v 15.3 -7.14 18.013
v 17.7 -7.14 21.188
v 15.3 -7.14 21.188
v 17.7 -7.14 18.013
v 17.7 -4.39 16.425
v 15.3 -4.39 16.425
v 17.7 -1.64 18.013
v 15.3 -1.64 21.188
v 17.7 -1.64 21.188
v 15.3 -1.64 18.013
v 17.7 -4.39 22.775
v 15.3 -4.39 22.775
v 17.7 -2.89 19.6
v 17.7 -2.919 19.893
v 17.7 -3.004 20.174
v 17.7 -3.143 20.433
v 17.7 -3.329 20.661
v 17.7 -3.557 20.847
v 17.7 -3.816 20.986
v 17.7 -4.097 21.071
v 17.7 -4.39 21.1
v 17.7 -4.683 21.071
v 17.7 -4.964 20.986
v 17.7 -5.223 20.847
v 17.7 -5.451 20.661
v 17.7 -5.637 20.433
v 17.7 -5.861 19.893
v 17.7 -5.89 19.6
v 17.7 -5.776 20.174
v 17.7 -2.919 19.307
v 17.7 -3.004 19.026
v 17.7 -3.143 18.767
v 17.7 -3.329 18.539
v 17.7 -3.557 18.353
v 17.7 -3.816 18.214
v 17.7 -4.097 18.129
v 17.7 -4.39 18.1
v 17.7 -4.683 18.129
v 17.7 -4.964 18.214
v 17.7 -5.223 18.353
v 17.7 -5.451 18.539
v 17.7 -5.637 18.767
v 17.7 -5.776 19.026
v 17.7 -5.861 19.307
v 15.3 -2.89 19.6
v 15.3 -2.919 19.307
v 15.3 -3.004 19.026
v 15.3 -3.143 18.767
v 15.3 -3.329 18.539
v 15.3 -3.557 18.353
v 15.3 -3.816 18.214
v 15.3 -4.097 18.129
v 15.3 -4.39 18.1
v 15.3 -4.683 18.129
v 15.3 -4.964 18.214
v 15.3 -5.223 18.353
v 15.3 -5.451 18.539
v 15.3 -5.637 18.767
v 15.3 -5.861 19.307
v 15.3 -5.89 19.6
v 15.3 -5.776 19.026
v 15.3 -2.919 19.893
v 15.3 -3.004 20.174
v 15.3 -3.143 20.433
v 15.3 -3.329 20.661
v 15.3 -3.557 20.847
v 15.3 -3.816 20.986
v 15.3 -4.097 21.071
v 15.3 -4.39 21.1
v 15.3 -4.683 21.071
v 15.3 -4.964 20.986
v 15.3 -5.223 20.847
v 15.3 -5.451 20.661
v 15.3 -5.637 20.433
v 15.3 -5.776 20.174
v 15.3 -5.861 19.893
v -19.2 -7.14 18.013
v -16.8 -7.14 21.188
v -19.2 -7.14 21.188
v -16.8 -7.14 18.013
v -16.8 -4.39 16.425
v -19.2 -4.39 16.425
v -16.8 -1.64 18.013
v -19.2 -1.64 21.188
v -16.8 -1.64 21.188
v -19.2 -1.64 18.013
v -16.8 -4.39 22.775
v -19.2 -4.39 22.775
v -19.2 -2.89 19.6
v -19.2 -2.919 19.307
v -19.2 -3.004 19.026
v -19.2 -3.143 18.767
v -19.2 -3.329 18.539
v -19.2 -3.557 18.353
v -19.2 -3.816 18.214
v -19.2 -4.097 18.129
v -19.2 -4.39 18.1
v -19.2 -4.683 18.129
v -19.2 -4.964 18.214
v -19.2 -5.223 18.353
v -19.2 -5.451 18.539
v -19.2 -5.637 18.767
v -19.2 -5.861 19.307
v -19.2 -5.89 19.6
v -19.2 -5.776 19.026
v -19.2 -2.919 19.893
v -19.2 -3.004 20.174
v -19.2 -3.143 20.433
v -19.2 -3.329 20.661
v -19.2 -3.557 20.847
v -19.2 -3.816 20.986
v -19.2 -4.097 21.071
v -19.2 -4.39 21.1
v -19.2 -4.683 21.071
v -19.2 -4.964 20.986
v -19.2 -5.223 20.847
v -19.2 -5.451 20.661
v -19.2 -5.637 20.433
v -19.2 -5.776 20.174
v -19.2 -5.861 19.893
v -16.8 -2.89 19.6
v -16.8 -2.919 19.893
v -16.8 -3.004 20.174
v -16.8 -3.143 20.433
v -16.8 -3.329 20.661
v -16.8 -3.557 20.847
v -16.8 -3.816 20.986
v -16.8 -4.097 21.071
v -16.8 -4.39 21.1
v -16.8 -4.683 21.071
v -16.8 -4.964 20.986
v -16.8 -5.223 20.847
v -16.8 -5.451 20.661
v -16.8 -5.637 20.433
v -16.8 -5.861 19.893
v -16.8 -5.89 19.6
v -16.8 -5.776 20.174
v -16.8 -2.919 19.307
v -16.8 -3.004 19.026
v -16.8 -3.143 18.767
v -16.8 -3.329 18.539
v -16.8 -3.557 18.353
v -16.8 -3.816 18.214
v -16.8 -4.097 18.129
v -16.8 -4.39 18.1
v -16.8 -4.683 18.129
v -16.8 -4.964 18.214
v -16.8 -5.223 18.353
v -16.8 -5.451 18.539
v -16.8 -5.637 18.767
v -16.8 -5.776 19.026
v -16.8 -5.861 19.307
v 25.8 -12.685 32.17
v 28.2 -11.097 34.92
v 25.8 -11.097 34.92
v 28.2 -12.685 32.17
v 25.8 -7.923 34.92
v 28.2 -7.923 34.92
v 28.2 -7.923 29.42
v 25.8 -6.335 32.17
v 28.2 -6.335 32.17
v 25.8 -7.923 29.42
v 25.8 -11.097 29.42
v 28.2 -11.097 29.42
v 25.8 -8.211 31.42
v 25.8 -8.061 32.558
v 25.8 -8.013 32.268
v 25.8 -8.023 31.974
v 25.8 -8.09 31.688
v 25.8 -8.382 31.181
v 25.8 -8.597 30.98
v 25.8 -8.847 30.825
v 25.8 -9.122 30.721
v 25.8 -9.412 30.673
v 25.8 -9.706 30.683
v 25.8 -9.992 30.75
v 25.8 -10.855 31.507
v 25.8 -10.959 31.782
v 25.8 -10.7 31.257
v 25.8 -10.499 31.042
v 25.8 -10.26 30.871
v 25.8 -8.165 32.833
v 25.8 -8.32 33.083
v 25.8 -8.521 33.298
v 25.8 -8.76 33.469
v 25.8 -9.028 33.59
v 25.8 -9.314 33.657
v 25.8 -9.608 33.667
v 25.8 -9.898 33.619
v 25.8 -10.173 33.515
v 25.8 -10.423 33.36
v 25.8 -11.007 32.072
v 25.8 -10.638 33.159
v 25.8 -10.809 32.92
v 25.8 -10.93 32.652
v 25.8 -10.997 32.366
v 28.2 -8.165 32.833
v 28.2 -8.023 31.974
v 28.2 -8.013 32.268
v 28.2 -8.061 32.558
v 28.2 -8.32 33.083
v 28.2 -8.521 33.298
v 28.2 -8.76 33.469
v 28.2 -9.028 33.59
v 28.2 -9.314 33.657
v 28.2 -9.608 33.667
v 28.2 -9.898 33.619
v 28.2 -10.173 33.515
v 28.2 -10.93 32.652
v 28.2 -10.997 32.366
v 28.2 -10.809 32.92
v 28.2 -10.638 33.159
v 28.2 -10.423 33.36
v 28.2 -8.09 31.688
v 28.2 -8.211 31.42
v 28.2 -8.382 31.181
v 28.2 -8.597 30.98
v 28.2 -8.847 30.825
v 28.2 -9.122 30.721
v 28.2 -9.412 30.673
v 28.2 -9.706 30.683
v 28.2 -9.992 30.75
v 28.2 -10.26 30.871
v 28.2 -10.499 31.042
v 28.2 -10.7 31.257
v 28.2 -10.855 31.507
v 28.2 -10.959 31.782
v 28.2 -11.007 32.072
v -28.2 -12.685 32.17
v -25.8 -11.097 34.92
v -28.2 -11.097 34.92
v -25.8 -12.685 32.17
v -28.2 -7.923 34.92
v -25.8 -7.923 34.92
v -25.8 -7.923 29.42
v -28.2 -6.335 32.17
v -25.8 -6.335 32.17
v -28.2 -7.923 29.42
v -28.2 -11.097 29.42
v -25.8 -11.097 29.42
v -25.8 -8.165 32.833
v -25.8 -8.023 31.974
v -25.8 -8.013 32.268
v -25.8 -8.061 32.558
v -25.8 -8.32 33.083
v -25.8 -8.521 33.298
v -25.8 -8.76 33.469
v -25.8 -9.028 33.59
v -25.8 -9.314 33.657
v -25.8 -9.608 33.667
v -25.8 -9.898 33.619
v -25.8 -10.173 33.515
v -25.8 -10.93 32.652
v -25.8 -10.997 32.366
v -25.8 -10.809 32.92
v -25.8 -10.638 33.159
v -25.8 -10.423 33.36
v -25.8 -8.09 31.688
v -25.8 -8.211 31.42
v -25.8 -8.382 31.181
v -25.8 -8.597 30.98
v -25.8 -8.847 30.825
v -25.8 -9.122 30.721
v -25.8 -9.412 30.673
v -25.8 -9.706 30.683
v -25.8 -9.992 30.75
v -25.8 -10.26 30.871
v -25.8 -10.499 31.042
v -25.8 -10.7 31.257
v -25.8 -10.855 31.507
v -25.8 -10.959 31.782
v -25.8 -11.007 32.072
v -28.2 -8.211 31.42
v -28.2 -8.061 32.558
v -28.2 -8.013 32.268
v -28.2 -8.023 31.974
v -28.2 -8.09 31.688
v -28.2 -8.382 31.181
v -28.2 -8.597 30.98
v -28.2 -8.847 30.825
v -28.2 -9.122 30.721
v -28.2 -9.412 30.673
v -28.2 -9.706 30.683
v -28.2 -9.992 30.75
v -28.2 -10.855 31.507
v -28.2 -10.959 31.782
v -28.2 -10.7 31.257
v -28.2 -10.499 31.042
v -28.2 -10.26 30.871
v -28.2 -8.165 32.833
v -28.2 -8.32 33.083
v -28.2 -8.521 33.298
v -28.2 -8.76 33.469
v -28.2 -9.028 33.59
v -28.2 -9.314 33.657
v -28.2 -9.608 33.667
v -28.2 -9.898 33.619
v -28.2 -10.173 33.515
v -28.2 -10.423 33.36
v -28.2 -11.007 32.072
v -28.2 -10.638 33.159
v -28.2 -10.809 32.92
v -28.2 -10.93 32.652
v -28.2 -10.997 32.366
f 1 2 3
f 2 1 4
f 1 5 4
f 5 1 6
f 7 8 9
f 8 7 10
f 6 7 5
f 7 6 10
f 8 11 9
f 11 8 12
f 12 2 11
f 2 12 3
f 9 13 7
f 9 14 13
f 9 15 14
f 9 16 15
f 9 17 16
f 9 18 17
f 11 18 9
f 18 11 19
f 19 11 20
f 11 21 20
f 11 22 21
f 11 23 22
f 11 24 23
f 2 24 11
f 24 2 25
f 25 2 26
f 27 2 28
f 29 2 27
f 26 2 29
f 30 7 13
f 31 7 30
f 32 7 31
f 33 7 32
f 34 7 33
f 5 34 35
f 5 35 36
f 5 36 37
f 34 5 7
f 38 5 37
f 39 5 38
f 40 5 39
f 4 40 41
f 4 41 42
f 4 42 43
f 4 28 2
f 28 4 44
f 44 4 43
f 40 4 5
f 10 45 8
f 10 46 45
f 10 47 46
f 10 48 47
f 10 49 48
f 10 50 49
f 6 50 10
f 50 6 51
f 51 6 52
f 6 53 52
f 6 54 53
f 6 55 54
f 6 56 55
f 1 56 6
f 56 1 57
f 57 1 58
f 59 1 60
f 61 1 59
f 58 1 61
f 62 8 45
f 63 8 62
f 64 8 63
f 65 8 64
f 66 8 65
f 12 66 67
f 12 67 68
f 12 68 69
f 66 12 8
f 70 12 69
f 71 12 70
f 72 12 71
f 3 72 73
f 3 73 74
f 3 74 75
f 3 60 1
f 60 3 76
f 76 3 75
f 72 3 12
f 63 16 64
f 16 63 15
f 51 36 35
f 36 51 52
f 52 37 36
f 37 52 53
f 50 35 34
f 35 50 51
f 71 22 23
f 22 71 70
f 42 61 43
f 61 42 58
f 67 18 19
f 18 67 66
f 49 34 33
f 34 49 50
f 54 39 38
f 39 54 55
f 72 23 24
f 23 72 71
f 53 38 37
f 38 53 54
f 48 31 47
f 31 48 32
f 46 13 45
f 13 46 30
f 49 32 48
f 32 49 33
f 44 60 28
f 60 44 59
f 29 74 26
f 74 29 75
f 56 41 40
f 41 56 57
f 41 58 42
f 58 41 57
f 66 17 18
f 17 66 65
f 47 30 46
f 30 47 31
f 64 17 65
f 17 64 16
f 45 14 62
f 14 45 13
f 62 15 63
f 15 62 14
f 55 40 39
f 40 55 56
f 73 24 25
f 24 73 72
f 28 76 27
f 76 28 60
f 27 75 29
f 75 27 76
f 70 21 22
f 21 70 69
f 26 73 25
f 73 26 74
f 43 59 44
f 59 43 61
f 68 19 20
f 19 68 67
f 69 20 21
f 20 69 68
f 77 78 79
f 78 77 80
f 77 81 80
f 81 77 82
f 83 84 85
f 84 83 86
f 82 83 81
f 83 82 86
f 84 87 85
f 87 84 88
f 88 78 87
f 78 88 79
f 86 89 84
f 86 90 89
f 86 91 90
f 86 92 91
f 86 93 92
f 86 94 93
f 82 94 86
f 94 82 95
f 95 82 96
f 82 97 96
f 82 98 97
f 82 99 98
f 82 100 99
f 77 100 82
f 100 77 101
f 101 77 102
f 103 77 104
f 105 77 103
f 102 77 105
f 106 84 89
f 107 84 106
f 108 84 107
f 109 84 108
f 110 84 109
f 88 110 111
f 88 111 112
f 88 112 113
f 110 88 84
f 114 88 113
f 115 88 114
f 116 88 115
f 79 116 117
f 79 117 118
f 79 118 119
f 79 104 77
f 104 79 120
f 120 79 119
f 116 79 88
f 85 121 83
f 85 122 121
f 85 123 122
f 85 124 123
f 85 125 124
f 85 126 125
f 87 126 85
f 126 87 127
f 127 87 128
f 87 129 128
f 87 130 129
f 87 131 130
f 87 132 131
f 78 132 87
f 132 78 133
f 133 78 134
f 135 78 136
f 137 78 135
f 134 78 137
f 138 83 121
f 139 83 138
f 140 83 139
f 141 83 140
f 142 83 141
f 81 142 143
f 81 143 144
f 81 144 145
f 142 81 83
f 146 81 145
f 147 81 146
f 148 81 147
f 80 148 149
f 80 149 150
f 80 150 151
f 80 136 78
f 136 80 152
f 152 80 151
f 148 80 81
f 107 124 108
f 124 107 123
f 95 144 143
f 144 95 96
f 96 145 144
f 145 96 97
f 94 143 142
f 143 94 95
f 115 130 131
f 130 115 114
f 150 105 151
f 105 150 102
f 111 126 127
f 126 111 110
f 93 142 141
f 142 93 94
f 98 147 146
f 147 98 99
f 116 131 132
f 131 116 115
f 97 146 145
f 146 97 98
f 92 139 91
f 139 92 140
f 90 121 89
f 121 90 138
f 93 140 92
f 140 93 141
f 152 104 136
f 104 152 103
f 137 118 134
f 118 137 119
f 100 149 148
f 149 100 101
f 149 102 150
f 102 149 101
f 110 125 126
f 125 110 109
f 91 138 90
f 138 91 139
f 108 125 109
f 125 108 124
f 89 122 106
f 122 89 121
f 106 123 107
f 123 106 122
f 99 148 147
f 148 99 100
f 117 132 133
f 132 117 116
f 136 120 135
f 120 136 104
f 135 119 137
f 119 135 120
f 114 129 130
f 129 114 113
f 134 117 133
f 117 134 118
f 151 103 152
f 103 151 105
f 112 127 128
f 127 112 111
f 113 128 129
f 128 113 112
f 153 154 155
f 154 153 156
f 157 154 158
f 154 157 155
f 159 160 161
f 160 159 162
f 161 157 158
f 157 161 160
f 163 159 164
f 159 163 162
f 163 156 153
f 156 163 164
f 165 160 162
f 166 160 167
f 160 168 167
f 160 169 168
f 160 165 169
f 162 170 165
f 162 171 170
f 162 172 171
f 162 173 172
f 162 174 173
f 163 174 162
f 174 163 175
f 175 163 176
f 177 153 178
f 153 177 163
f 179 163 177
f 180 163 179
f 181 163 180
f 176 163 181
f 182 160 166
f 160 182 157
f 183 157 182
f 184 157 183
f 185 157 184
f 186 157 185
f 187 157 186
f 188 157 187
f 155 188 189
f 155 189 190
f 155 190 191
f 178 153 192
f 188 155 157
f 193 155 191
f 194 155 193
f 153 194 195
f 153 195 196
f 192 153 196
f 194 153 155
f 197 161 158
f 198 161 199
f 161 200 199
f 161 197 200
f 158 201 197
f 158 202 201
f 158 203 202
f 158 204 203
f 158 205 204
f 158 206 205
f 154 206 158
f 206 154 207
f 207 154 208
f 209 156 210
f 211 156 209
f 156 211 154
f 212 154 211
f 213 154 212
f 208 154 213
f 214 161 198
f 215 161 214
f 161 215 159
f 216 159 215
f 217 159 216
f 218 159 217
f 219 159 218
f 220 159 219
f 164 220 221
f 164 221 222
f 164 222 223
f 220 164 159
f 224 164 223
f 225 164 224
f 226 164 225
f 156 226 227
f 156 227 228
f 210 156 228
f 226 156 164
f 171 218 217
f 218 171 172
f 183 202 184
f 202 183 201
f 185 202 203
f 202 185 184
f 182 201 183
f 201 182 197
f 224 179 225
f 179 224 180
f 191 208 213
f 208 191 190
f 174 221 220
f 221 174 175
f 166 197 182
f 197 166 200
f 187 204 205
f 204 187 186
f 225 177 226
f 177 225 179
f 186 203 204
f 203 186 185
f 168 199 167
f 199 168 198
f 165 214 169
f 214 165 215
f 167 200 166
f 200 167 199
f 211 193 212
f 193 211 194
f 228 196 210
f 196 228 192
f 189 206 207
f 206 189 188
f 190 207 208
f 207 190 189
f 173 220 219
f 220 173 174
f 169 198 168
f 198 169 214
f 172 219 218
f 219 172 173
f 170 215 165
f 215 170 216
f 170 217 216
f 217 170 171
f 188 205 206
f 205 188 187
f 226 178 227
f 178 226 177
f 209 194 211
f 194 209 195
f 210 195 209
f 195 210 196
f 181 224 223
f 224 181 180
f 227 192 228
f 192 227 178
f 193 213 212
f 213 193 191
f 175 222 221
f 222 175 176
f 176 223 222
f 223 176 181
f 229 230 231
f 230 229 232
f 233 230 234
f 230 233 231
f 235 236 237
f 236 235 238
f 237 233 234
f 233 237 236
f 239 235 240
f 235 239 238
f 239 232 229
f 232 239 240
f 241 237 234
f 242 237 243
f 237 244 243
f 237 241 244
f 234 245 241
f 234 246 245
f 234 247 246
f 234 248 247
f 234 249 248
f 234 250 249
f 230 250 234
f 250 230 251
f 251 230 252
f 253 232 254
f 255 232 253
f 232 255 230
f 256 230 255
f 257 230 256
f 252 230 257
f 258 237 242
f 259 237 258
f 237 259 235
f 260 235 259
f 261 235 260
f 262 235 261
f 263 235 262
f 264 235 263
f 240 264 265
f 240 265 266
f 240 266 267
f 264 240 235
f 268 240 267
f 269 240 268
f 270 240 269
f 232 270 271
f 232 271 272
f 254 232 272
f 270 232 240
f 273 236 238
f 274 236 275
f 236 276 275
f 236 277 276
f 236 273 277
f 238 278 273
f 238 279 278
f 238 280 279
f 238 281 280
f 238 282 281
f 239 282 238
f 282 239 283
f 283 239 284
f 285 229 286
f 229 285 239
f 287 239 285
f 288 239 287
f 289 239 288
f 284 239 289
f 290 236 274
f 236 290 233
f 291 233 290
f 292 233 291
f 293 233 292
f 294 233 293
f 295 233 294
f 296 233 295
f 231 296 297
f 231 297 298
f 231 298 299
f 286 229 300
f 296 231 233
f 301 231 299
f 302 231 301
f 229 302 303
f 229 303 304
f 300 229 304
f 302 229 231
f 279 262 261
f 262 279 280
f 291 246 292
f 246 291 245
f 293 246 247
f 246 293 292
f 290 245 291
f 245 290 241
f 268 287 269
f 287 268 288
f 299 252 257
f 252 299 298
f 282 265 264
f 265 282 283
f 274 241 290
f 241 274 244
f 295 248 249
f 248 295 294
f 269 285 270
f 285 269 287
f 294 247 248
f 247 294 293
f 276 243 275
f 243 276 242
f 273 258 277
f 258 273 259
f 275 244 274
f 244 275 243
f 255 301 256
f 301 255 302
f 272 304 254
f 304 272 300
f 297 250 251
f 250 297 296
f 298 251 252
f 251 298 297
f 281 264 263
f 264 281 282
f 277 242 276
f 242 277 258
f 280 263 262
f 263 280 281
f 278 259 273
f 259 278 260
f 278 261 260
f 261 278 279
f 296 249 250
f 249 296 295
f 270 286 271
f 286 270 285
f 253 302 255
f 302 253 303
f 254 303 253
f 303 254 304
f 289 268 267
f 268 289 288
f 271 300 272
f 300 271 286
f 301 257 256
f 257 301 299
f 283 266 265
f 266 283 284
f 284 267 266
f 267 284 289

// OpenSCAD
// color: #b9bec4
// variant: normal
// material: metal
// PREVIEW ONLY: M3 nuts (duct screws, in the body's nut pockets, and adapter screws under the blowers).
$fn = 32;
module nut(d = 6.35, h = 2.4) difference() { cylinder(d = d, h = h, $fn = 6); translate([0, 0, -0.1]) cylinder(d = 3, h = h + 0.2); }

// duct screws: nut dropped into the body's pocket, resting on a corner (the body is not symmetric:
// the left pocket sits 1.5 mm further out than the right one)
for (p = [[1, 15.3], [-1, 16.8]]) mirror([p[0] < 0 ? 1 : 0, 0, 0])
    translate([p[1], -4.39, 19.6]) rotate([0, 90, 0]) nut();
for (s = [1, -1]) mirror([s < 0 ? 1 : 0, 0, 0])
    translate([28.2, -9.51, 32.17]) rotate([0, -90, 0]) rotate([0, 0, 30]) nut();   // flat side down, clear of the duct ear
